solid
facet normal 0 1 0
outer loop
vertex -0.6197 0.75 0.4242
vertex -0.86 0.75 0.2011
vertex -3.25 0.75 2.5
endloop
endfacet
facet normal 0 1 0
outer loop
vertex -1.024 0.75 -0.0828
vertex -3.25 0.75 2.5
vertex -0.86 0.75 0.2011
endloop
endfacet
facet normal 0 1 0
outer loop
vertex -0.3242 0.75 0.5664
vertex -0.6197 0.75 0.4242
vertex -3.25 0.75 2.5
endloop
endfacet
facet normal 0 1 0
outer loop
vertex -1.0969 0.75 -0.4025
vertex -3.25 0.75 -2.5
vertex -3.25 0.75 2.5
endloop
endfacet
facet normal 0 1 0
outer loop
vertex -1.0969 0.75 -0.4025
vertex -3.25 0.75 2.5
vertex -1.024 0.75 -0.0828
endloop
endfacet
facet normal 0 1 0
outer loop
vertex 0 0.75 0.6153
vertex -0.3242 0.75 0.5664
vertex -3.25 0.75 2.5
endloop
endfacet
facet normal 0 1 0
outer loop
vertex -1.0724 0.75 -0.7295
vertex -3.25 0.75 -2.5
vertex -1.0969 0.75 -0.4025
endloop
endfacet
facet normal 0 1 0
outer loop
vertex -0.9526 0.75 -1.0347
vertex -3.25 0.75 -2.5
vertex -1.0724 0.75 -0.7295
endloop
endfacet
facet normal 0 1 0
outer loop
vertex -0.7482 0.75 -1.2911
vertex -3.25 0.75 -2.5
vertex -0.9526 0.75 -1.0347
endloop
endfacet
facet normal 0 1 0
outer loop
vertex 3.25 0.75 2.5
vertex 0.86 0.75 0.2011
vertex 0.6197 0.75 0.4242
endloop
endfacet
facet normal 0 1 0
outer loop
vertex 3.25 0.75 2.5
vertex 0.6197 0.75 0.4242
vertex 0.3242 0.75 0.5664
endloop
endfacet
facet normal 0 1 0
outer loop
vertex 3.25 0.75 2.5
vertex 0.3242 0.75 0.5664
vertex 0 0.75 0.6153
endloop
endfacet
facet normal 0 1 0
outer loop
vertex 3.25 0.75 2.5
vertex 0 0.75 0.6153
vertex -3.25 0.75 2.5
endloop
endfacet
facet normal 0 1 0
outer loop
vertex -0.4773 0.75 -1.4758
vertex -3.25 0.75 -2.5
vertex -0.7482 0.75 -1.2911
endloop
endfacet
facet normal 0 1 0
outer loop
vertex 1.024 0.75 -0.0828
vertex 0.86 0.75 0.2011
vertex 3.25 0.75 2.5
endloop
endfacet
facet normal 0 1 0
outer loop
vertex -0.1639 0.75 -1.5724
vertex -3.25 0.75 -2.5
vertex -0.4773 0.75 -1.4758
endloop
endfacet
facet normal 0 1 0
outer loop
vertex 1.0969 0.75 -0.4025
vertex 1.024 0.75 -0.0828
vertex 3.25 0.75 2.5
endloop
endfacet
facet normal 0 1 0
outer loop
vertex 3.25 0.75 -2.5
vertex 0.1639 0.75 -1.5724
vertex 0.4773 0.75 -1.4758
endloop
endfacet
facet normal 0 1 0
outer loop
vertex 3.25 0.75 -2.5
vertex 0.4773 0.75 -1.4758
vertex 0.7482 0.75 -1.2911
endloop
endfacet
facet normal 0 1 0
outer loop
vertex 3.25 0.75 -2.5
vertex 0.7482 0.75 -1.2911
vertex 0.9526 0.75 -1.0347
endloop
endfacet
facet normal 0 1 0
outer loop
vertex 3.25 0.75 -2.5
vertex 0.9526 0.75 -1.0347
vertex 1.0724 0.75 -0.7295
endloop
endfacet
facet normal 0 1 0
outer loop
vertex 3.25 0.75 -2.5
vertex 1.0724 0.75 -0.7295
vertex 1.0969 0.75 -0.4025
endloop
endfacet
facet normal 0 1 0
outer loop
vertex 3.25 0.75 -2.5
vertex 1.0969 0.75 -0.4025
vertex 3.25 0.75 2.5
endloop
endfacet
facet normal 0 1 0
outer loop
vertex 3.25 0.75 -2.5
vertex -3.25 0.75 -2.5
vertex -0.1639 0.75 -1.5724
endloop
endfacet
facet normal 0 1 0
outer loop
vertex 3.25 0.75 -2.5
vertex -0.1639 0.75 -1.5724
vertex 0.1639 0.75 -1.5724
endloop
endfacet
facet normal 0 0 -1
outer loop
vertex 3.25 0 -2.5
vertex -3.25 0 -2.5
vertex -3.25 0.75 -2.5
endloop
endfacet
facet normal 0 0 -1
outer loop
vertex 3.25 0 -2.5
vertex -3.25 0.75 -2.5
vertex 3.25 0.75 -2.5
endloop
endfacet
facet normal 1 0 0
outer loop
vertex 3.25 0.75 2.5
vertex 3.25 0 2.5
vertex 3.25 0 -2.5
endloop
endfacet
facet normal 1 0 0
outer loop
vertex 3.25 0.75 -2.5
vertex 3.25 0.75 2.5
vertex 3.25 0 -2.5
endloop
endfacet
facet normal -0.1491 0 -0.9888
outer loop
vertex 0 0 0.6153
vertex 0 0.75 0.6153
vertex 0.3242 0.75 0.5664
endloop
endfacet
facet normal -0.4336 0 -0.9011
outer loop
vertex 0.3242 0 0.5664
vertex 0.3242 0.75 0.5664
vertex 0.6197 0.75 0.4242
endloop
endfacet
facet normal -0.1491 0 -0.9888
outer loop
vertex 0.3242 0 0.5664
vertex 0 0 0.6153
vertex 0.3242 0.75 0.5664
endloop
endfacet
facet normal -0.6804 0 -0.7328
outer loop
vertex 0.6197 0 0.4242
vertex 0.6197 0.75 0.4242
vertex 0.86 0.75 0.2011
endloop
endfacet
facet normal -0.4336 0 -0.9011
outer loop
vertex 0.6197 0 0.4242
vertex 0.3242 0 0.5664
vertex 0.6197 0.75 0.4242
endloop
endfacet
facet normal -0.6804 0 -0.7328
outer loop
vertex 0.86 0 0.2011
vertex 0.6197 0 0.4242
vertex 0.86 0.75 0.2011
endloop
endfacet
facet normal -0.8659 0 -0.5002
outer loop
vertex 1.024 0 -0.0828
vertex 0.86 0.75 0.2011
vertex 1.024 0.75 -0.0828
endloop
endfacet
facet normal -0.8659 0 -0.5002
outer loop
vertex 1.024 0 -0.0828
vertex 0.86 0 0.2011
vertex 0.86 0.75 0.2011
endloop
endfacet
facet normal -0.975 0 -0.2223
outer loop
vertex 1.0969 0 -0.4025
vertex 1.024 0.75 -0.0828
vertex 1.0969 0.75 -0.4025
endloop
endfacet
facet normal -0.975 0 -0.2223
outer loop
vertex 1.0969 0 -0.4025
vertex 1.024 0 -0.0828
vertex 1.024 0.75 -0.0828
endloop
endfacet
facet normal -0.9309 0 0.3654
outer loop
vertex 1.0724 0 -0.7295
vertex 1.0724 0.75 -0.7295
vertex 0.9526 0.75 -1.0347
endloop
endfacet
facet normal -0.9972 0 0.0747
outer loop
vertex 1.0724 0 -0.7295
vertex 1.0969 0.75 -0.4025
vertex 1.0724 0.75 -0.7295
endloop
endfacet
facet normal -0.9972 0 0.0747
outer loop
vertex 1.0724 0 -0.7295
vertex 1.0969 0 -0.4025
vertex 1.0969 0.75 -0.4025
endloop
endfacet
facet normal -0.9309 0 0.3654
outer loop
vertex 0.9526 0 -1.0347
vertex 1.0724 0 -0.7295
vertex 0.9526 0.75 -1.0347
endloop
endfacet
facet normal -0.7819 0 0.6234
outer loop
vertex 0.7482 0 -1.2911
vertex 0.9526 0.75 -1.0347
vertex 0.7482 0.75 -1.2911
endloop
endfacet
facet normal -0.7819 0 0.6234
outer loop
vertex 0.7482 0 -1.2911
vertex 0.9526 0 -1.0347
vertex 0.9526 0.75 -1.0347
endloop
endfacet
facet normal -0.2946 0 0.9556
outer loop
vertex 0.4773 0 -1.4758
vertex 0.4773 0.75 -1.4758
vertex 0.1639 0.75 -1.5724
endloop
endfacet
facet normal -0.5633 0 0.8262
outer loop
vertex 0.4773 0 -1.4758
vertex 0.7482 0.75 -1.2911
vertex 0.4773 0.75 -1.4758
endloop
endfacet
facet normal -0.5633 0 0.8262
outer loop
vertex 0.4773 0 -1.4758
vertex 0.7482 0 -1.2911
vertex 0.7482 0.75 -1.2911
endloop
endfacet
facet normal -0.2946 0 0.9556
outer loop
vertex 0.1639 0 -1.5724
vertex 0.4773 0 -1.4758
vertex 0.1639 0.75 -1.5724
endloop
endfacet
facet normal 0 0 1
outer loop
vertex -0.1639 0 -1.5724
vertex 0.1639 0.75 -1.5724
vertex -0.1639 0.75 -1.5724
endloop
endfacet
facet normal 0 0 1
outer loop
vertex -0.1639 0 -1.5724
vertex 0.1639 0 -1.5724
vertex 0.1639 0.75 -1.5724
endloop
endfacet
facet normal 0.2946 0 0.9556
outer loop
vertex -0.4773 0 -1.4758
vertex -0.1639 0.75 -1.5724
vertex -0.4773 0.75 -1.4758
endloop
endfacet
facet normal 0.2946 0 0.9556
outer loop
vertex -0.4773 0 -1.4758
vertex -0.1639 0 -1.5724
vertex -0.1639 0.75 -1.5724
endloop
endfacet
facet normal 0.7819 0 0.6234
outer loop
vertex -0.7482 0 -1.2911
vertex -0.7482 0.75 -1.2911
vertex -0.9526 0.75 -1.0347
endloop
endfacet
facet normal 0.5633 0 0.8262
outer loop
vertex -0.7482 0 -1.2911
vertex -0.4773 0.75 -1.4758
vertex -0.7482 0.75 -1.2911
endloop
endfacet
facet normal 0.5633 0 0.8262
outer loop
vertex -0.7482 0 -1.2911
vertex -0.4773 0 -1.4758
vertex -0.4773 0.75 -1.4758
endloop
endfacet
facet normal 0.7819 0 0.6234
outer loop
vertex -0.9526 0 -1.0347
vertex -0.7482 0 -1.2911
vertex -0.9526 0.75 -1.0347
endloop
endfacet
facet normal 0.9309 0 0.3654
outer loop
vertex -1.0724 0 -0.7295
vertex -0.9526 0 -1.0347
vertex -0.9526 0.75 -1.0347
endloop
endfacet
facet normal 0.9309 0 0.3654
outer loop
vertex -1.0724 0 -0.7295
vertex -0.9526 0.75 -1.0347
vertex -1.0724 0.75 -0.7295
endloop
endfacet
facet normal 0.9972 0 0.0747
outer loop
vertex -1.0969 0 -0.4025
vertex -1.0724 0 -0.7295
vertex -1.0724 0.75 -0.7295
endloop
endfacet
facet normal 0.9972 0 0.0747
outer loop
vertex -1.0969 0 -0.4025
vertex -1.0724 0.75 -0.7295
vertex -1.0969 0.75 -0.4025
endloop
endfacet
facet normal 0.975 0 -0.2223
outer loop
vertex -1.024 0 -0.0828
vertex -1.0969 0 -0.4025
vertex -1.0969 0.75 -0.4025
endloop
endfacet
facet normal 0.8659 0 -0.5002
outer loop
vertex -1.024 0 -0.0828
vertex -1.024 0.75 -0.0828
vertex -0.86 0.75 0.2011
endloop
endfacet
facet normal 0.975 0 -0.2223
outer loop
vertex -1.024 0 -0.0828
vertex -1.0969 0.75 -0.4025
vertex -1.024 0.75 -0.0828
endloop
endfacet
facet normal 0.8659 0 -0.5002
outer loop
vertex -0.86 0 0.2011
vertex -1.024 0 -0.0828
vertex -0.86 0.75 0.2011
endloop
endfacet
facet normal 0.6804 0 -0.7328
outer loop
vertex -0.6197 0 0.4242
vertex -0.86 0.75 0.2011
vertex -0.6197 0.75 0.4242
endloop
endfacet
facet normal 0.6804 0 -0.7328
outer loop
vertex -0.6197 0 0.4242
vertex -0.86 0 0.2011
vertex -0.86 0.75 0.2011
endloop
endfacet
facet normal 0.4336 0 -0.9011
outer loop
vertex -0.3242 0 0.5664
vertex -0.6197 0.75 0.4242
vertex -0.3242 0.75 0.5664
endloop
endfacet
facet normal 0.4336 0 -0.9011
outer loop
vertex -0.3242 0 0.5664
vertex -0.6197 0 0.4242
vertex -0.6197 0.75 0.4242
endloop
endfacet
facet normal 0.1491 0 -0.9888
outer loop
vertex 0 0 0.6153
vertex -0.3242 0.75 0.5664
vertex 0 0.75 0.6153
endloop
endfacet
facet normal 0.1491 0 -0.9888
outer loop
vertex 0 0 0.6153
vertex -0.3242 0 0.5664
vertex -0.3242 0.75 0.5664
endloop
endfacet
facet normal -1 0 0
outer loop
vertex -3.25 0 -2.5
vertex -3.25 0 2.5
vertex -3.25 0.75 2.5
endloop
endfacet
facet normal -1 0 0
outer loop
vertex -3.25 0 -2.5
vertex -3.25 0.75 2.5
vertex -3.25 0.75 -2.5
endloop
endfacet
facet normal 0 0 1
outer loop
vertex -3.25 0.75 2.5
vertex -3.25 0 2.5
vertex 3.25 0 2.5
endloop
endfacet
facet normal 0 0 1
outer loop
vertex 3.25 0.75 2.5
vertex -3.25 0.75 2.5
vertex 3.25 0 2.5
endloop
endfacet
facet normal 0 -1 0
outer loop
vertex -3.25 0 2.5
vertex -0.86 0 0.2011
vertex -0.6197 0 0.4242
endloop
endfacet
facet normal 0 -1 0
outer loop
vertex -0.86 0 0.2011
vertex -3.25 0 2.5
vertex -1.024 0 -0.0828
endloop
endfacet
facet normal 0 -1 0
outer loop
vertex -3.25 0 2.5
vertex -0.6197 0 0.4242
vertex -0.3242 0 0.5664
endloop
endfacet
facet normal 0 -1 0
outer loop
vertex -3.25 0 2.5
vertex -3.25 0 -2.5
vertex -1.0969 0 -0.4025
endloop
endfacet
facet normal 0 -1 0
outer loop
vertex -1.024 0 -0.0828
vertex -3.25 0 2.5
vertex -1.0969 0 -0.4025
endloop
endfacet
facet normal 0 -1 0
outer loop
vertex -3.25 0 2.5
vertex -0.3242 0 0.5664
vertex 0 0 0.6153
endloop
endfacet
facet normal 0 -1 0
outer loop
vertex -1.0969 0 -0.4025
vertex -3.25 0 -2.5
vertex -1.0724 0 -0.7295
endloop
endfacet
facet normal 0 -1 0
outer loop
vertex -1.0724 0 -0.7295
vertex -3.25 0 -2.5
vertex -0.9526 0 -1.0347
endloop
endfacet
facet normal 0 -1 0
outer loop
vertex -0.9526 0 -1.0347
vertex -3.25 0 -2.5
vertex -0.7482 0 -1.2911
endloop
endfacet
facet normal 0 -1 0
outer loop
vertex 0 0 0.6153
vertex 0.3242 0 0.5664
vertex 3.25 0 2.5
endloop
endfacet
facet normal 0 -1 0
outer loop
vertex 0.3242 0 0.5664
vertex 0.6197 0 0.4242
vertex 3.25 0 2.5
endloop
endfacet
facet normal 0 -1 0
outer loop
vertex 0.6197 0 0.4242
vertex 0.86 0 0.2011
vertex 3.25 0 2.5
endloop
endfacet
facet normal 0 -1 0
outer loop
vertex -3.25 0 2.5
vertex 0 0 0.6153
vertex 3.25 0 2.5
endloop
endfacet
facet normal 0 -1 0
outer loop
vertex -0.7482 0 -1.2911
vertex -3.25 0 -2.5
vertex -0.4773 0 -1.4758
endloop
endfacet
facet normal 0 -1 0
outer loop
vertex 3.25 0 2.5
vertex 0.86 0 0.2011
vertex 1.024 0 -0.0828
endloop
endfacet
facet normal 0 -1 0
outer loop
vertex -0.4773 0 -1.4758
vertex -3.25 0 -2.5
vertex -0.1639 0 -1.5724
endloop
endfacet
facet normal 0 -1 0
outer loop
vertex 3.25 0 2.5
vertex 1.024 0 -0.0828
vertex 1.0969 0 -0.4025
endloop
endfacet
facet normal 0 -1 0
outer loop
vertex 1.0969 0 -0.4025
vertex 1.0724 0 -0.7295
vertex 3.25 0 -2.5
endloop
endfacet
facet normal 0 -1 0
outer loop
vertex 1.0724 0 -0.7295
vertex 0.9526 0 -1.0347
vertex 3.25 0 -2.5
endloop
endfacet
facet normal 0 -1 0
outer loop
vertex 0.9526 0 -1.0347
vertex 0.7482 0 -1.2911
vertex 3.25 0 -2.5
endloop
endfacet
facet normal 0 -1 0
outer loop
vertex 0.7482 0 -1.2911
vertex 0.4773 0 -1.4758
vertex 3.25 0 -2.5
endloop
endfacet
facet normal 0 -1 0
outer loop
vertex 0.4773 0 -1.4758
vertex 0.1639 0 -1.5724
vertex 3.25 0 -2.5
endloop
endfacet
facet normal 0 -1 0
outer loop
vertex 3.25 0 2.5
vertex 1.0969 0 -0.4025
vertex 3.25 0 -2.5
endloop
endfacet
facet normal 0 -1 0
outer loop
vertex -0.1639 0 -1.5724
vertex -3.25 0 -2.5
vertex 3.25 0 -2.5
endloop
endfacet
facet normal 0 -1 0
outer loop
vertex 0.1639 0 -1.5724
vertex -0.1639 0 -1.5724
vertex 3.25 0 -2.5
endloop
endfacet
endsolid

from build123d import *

# Parameters (mm, degrees)
SKETCH1_W           = 6.5
SKETCH1_H           = 5
BOSS_EXTRUDE1_DEPTH = 0.75
SKETCH2_R           = 1.1
CUT_EXTRUDE1_DEPTH  = 5.168333


with BuildPart() as part:
    # Sketch1 → Boss-Extrude1 (new body)
    with BuildSketch(Plane(origin=(0, 0, 0), x_dir=(1, 0, 0), z_dir=(0, 1, 0))):
        Rectangle(SKETCH1_W, SKETCH1_H)
    extrude(amount=BOSS_EXTRUDE1_DEPTH)

    # Sketch2 → Cut-Extrude1 (cut, through all)
    with BuildSketch(Plane(origin=(0, 0, 0), x_dir=(1, 0, 0), z_dir=(0, 1, 0))):
        with Locations(Location((0, 0.484711092, 0), (0, 0, 270))):
            Circle(SKETCH2_R)
    extrude(amount=CUT_EXTRUDE1_DEPTH, mode=Mode.SUBTRACT)


solid = part.part
